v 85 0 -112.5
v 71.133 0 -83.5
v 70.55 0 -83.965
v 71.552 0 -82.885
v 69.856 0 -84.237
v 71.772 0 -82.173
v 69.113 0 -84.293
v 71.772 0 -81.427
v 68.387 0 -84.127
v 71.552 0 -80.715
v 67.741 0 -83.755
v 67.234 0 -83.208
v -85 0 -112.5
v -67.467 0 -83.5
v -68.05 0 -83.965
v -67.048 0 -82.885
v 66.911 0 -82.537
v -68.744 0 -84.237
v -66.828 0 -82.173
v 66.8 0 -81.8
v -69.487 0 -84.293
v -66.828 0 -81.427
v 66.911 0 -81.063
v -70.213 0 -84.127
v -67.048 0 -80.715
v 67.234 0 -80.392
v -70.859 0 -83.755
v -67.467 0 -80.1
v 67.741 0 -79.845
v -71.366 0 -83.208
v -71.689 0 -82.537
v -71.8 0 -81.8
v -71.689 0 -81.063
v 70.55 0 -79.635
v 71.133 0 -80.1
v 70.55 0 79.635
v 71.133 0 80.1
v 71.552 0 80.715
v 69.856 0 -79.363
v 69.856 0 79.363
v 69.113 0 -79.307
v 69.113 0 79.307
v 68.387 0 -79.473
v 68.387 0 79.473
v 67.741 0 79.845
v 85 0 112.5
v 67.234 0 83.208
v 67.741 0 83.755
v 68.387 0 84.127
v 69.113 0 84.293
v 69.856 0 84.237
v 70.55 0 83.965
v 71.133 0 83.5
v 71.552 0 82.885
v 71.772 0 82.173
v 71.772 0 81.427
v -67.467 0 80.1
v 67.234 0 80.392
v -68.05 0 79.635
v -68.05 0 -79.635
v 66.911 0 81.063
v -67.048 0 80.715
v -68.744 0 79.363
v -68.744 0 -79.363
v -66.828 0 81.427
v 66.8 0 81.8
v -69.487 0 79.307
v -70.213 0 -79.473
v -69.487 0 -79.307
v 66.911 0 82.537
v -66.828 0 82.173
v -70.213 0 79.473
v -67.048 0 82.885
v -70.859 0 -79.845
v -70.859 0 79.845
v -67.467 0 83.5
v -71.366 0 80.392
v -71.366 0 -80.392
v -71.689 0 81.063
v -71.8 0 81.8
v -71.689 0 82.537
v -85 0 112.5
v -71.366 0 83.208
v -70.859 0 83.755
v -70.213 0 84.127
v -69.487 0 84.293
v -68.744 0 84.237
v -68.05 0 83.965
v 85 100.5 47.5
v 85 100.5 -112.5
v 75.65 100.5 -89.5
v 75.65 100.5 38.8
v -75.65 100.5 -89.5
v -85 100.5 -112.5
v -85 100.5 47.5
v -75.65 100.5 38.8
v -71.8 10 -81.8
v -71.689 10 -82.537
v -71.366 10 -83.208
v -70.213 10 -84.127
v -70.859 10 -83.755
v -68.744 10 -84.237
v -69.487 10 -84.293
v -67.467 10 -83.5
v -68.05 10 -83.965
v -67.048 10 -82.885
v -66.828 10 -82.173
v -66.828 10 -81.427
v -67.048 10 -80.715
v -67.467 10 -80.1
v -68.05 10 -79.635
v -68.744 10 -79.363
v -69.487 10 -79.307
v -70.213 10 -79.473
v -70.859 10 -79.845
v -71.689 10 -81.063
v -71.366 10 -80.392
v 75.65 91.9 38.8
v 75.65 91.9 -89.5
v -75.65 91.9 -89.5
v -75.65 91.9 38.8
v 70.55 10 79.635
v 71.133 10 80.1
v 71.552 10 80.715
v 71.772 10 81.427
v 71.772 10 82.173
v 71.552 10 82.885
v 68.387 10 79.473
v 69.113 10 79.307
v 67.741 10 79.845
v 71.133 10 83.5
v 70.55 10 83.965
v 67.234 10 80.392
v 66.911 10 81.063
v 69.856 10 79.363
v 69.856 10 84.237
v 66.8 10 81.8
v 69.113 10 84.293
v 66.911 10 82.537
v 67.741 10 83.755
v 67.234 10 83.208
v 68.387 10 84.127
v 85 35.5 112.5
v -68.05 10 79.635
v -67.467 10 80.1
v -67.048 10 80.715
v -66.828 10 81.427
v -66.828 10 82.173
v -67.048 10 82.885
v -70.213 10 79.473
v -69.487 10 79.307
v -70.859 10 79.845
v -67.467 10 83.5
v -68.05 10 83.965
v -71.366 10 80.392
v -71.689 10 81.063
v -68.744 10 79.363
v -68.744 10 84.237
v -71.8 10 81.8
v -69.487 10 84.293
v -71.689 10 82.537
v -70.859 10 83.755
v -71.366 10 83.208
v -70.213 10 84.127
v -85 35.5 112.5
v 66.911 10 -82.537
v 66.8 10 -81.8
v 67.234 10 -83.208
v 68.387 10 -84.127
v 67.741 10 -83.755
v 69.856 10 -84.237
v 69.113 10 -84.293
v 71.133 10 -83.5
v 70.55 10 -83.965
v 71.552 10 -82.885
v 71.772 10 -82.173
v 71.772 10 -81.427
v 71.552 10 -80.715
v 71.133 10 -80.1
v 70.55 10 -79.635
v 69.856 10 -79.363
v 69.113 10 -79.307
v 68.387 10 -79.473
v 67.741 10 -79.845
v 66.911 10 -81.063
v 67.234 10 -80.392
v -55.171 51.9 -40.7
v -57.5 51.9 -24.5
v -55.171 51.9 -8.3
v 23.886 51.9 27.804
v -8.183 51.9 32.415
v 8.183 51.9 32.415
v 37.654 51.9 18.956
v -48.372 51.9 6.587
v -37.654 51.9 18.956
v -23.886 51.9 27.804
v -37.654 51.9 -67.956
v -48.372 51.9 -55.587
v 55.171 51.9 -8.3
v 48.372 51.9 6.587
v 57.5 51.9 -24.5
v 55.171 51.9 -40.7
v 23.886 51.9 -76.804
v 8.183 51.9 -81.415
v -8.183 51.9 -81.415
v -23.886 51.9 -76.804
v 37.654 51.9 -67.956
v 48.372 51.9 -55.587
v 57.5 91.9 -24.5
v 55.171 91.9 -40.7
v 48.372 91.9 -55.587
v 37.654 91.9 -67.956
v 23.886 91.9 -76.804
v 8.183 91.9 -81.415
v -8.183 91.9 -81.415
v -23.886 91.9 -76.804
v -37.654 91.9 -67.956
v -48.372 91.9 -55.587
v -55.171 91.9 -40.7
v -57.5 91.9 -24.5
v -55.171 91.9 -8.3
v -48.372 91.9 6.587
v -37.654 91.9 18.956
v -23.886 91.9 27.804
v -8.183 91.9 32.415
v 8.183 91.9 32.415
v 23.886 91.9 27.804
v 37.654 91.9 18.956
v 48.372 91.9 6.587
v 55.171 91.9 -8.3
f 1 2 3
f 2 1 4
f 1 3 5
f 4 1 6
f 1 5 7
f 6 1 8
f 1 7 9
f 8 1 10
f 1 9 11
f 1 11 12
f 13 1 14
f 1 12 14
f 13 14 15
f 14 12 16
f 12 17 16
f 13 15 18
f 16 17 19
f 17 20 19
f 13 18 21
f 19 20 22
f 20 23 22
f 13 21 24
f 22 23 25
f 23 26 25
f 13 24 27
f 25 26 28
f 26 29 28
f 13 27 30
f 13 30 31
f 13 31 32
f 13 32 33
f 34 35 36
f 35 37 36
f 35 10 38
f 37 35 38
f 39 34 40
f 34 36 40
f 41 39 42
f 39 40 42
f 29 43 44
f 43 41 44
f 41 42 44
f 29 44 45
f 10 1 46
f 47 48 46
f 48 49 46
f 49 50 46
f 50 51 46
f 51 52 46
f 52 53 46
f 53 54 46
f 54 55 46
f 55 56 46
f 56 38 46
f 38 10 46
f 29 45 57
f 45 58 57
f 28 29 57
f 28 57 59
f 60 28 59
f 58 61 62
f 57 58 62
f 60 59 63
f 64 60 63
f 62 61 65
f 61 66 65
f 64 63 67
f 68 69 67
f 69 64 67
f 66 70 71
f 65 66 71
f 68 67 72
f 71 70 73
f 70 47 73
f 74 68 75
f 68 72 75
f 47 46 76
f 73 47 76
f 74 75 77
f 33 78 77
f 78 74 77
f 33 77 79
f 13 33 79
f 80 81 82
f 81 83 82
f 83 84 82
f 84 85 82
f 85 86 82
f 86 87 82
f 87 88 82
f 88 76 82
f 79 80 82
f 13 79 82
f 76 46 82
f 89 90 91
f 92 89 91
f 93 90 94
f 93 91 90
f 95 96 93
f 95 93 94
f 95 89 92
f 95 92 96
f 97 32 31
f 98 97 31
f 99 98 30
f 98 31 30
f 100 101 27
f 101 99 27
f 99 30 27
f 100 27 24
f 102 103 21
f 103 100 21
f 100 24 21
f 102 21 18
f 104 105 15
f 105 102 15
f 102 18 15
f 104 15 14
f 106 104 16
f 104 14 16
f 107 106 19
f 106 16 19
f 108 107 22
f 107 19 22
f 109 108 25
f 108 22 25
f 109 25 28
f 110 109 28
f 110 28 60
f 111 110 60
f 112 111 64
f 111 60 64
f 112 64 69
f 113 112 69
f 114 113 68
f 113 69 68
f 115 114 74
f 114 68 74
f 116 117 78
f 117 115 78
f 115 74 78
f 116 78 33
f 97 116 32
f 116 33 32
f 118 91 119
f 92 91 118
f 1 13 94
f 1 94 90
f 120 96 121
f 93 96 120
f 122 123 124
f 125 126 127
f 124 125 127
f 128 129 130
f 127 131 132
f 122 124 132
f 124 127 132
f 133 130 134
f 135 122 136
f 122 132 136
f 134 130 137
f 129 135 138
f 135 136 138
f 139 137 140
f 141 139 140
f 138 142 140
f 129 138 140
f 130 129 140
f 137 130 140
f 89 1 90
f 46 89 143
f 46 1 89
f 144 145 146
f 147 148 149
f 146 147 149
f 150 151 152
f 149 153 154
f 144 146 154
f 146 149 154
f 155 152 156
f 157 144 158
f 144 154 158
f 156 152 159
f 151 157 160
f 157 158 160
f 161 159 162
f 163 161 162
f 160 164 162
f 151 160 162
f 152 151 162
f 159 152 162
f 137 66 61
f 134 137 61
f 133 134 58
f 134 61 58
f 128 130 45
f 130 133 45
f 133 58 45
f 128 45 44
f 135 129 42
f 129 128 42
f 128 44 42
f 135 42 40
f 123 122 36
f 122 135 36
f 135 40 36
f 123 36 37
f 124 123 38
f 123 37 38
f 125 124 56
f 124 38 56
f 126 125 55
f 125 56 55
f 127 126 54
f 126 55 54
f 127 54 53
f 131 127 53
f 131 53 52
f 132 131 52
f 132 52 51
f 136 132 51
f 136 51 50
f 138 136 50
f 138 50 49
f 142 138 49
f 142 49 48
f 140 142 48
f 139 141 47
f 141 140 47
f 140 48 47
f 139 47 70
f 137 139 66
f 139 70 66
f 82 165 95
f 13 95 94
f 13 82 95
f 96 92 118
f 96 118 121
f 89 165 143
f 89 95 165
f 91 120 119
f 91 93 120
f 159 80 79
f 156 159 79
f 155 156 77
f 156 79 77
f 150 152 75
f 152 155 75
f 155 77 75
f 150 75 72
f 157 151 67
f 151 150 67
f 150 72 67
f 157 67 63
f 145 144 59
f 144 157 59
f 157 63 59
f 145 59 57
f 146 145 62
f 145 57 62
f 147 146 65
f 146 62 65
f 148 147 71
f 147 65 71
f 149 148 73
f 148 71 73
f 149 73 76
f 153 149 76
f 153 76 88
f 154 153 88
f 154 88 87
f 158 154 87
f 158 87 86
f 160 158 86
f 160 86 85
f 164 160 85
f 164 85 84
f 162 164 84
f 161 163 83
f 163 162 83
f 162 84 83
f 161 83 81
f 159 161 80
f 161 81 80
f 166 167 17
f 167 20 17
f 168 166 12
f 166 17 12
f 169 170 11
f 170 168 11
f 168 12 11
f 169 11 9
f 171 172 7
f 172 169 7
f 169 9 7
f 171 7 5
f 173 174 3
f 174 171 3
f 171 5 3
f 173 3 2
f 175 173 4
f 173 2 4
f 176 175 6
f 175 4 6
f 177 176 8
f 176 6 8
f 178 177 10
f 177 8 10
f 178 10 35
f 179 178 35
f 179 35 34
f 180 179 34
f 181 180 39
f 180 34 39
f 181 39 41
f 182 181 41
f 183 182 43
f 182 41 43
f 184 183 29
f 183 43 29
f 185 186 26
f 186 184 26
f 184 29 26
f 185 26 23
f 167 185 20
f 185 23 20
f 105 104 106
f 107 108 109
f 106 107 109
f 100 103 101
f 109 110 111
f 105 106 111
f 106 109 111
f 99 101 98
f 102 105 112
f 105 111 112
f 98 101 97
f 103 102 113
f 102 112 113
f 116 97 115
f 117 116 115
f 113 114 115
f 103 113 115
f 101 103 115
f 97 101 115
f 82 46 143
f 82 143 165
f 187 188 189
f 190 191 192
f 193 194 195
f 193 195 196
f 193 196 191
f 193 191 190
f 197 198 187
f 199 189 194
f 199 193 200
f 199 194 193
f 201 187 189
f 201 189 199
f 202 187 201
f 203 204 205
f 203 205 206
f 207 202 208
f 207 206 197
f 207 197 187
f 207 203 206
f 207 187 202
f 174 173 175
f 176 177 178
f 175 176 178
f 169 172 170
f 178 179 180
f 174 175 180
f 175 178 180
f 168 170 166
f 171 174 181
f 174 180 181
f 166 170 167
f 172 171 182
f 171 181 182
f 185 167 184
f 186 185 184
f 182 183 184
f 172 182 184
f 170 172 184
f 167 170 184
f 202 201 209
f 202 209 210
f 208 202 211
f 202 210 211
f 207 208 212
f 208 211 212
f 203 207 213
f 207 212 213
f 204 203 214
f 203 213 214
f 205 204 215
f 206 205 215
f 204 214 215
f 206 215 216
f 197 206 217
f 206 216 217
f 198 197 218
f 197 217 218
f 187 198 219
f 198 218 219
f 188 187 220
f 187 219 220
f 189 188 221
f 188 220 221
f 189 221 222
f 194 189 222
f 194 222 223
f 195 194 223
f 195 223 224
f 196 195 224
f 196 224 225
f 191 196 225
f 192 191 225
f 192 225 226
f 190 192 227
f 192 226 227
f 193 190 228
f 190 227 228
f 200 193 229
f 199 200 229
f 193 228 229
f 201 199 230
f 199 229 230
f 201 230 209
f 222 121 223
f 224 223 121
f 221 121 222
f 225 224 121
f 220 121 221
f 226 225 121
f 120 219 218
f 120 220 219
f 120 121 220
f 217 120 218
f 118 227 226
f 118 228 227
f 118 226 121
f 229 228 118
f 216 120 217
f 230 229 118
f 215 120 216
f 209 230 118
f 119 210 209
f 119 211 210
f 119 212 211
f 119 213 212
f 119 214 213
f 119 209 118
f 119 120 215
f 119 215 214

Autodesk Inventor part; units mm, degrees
ref_plane "YZ Plane" through (0, 0, 0) normal (1, 0, 0) x (0, 1, 0)
ref_plane "XZ Plane" through (0, 0, 0) normal (0, 1, 0) x (-1, 0, 0)
ref_plane "XY Plane" through (0, 0, 0) normal (0, 0, 1) x (1, 0, 0)
sketch "Sketch1" plane through (0, 0, 0) normal (0, 1, 0) x (-1, 0, 0)
  line L0 (-85, 112.5) -> (85, 112.5)
  line L1 (85, 112.5) -> (85, -112.5)
  line L2 (85, -112.5) -> (-85, -112.5)
  line L3 (-85, -112.5) -> (-85, 112.5)
  line L4 (-85, 112.5) -> (85, -112.5) construction
  line L5 (85, 112.5) -> (-85, -112.5) construction
  circle A0 centre (69.3, 81.8) radius 2.5
  circle A1 centre (69.3, -81.8) radius 2.5
  circle A2 centre (-69.3, -81.8) radius 2.5
  circle A3 centre (-69.3, 81.8) radius 2.5
  line L6 (69.3, 81.8) -> (-69.3, 81.8) construction
  line L7 (69.3, 81.8) -> (69.3, -81.8) construction
  line L8 (69.3, -81.8) -> (-69.3, -81.8) construction
  line L9 (69.3, 0) -> (0, 0) construction
  line L10 (0, 81.8) -> (0, 0) construction
  dimension "d2" = 170
  dimension "d3" = 225
  dimension "d9" = 163.6
  dimension "d10" = 5
  dimension "d11" = 138.6
extrude "Extrusion1" add sketch "Sketch1" along normal blind 100.5 contours L0 L1 L2 L3 | A0 | A1 | A2 | A3
extrude "Extrusion2" cut sketch "Sketch1" along normal blind 10 contours A0 | A1 | A2 | A3
chamfer "Chamfer1" distance 65 angle 45 1 edges at (0, 100.5, 112.5)
sketch "Sketch2" plane through (0, 100.5, 0) normal (0, 1, 0) x (1, 0, 0)
  line L0 (75.65, -38.8) -> (-75.65, -38.8)
  line L1 (-75.65, -38.8) -> (-75.65, 89.5)
  line L2 (-75.65, 89.5) -> (75.65, 89.5)
  line L3 (75.65, 89.5) -> (75.65, -38.8)
  line L4 (75.65, -38.8) -> (-75.65, 89.5) construction
  line L5 (-75.65, -38.8) -> (75.65, 89.5) construction
  line L6 (85, -47.5) -> (-85, -47.5) projected
  line L7 (85, -47.5) -> (85, 112.5) projected
  line L8 (85, 112.5) -> (-85, 112.5) projected
  line L9 (-85, 112.5) -> (-85, -47.5) projected
  line L10 (0, 89.5) -> (0, 112.5) construction
  circle A0 centre (0, 24.5) radius 57.5
  line L11 (0, 24.5) -> (0, 82) construction
  line L12 (0, 82) -> (0, 89.5) construction
  point P0 (0, 0)
  dimension "d21" = 115
  dimension "d18" = 151.3
  dimension "d19" = 128.3
  dimension "d20" = 23
  dimension "d22" = 7.5
extrude "Extrusion3" cut sketch "Sketch2" against normal blind 8.6 contours L0 L1 L2 L3 | A0
extrude "Extrusion4" cut sketch "Sketch2" against normal blind 40 from surface at -8.6 contours A0
properties part number "Spin Coater"
